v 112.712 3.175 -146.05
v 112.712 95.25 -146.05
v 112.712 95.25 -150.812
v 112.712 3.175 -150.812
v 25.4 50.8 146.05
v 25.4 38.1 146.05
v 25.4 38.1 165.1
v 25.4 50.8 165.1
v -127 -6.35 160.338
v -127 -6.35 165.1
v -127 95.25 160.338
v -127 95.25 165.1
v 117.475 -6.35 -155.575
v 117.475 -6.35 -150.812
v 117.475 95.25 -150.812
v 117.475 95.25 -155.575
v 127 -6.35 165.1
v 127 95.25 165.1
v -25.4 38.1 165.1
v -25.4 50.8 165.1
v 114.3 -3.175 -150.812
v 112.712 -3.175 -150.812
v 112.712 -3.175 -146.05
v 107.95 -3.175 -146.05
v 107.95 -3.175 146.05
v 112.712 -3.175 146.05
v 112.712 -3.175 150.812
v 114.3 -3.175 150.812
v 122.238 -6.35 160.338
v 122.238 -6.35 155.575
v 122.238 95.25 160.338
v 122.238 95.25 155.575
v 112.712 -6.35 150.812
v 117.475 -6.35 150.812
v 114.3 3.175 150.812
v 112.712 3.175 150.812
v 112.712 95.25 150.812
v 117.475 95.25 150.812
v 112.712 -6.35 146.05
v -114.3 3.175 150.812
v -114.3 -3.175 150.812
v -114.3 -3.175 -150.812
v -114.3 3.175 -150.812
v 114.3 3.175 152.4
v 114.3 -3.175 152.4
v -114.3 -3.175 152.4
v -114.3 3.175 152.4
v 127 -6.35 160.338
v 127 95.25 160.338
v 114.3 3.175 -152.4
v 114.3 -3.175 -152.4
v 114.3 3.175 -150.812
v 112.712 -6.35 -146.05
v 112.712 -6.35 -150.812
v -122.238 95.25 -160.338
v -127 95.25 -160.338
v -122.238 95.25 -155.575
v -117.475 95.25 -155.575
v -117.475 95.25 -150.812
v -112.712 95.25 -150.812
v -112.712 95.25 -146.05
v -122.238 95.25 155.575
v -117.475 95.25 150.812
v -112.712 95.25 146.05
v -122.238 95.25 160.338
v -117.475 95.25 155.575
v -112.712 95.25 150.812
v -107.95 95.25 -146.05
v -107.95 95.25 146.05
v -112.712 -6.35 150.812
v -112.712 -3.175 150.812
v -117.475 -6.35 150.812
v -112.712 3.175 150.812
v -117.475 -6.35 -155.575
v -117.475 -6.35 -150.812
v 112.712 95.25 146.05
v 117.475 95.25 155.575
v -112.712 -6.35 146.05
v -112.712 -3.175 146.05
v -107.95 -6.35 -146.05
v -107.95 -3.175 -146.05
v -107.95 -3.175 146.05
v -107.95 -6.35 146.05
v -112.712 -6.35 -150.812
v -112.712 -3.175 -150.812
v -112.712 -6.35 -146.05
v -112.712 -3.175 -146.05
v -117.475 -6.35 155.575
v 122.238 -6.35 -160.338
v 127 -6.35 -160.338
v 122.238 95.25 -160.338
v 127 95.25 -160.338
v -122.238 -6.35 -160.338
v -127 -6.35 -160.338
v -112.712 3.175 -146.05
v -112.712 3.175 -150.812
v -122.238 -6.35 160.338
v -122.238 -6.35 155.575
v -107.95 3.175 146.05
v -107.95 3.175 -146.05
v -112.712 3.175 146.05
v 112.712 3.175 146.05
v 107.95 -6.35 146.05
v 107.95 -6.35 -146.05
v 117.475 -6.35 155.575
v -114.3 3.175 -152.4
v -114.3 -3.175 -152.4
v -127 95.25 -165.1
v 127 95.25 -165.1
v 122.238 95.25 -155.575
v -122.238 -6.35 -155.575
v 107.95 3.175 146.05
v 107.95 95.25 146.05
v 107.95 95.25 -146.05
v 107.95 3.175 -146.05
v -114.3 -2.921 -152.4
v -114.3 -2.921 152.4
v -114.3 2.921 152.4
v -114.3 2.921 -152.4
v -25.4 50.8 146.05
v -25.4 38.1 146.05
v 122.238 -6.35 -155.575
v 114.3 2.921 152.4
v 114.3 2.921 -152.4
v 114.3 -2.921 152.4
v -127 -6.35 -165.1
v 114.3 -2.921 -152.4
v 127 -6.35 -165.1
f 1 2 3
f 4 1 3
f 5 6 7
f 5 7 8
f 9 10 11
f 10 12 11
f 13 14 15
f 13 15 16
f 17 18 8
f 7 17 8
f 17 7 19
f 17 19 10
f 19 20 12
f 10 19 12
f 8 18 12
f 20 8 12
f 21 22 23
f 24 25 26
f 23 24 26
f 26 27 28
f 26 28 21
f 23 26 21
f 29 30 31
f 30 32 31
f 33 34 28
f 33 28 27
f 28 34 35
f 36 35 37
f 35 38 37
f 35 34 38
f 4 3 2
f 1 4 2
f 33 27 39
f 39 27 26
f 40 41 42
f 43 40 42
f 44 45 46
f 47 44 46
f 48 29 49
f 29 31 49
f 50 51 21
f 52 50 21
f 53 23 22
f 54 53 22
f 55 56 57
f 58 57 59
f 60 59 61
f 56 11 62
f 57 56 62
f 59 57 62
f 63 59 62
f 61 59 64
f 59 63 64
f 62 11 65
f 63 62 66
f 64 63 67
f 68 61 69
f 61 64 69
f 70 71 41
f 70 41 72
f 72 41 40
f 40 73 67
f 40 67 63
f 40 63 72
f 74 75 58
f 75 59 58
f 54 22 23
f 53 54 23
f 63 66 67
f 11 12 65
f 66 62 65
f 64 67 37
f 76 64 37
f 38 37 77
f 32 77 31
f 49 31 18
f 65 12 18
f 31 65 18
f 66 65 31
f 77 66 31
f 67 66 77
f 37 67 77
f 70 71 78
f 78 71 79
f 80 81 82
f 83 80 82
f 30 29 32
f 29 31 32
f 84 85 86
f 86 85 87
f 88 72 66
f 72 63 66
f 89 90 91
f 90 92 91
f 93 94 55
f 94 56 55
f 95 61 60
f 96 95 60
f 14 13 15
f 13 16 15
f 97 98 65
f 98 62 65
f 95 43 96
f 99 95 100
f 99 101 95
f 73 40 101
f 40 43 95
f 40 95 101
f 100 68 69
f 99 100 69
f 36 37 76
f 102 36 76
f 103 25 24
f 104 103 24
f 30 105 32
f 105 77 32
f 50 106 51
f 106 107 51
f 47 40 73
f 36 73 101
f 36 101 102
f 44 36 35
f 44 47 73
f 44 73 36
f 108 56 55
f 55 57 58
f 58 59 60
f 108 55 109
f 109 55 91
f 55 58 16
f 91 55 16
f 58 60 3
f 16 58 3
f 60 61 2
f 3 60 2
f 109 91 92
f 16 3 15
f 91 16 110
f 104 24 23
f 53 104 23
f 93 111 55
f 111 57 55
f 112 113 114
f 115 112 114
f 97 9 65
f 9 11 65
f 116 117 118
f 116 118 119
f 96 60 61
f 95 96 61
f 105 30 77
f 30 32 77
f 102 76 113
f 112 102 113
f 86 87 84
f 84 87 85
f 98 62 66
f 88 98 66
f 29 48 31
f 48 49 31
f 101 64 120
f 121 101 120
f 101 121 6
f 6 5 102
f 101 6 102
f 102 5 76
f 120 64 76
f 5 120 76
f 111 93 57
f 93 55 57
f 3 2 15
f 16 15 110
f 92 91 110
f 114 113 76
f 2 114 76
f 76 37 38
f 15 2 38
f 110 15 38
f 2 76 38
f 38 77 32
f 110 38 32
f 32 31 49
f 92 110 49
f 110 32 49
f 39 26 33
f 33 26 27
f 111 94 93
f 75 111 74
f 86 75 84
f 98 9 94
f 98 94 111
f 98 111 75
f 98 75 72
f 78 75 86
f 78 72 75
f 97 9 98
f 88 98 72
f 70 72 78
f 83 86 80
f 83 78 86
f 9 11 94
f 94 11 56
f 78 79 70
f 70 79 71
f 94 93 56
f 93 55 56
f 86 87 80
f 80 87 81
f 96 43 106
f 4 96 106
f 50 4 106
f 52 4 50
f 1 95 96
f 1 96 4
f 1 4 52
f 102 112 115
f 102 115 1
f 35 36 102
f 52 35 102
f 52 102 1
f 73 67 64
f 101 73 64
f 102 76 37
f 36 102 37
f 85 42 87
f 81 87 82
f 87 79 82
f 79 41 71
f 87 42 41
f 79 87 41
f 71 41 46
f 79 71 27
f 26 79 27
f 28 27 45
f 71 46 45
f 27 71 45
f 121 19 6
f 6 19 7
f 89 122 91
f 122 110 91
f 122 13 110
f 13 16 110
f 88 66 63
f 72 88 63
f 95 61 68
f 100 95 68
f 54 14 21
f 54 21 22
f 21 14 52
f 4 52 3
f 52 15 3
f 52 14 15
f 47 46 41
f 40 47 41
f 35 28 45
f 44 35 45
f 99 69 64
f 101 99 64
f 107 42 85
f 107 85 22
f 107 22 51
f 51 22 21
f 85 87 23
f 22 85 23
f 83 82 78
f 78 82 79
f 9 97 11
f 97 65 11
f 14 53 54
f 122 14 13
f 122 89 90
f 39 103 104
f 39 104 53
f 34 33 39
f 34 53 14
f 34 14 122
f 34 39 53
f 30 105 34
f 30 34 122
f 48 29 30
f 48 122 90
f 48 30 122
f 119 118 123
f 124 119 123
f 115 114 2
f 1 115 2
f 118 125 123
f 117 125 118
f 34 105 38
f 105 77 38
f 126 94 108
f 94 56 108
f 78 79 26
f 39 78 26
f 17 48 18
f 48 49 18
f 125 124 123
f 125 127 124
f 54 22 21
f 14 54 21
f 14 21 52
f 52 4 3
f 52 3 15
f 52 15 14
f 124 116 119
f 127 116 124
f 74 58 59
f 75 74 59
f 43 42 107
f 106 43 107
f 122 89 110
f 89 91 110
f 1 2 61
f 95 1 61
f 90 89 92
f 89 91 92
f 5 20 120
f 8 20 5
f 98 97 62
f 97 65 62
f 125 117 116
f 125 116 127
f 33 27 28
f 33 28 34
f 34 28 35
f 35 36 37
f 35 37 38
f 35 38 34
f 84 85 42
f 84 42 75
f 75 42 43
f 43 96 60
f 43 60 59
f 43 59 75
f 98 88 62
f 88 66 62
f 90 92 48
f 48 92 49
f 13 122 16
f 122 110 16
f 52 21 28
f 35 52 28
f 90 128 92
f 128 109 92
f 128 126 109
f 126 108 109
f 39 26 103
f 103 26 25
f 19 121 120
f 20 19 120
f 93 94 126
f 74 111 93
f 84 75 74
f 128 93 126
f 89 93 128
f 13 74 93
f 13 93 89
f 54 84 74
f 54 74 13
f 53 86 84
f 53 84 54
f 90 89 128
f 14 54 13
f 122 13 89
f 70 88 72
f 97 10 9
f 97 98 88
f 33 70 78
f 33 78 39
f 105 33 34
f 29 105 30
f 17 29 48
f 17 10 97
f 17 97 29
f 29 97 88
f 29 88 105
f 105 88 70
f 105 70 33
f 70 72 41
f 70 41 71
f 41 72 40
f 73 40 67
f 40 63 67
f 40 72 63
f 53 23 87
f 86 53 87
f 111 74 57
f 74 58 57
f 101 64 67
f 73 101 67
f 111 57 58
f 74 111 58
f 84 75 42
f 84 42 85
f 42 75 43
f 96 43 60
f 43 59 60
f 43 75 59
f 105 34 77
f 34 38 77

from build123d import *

# Parameters (mm, degrees)
F1_DEPTH      = 95.25
F1_DEPTH_BACK = 6.35
F2_DEPTH      = 95.25
F2_DEPTH_BACK = 6.35
F3_DEPTH      = 3.175
F4_DEPTH      = 2.921
F5_W          = 50.8
F5_H          = 12.7
F6_DEPTH      = 25.4


with BuildPart() as f1:
    # F0 (on Front) → F1 (new body, two sides)
    with BuildSketch(Plane.XZ) as f1_sk:
        Polygon((-117.475, -150.8125), (-114.3, -150.8125), (-114.3, 150.8125), (-117.475, 150.8125), (-117.475, 155.575), (-122.2375, 155.575), (-122.2375, 160.3375), (-127, 160.3375), (-127, 0), (-127, -160.3375), (-122.2375, -160.3375), (-122.2375, -155.575), (-117.475, -155.575), align=None)
        Polygon((-107.95, -146.05), (-107.95, 0), (-107.95, 146.05), (-112.7125, 146.05), (-112.7125, 150.8125), (-114.3, 150.8125), (-114.3, -150.8125), (-112.7125, -150.8125), (-112.7125, -146.05), align=None)
    extrude(amount=-F1_DEPTH)
    extrude(f1_sk.sketch, amount=F1_DEPTH_BACK)


with BuildPart() as f1b:
    # F0 (on Front) → F1, piece 2 (new body, two sides)
    with BuildSketch(Plane.XZ) as f1_2_sk:
        Polygon((114.3, 150.8125), (114.3, -150.8125), (117.475, -150.8125), (117.475, -155.575), (122.2375, -155.575), (122.2375, -160.3375), (127, -160.3375), (127, 0), (127, 160.3375), (122.2375, 160.3375), (122.2375, 155.575), (117.475, 155.575), (117.475, 150.8125), align=None)
        Polygon((107.95, 0), (107.95, -146.05), (112.7125, -146.05), (112.7125, -150.8125), (114.3, -150.8125), (114.3, 150.8125), (112.7125, 150.8125), (112.7125, 146.05), (107.95, 146.05), align=None)
    extrude(amount=-F1_DEPTH)
    extrude(f1_2_sk.sketch, amount=F1_DEPTH_BACK)


with BuildPart() as f2:
    # F0 (on Front) → F2 (new body, two sides)
    with BuildSketch(Plane.XZ) as f2_sk:
        Polygon((-117.475, 150.8125), (-114.3, 150.8125), (-114.3, 152.4), (114.3, 152.4), (114.3, 150.8125), (117.475, 150.8125), (117.475, 155.575), (122.2375, 155.575), (122.2375, 160.3375), (127, 160.3375), (127, 165.1), (0, 165.1), (-127, 165.1), (-127, 160.3375), (-122.2375, 160.3375), (-122.2375, 155.575), (-117.475, 155.575), align=None)
        Polygon((-112.7125, 146.05), (-107.95, 146.05), (0, 146.05), (107.95, 146.05), (112.7125, 146.05), (112.7125, 150.8125), (114.3, 150.8125), (114.3, 152.4), (-114.3, 152.4), (-114.3, 150.8125), (-112.7125, 150.8125), align=None)
    extrude(amount=-F2_DEPTH)
    extrude(f2_sk.sketch, amount=F2_DEPTH_BACK)


with BuildPart() as f2b:
    # F0 (on Front) → F2, piece 2 (new body, two sides)
    with BuildSketch(Plane.XZ) as f2_2_sk:
        Polygon((0, -146.05), (-107.95, -146.05), (-112.7125, -146.05), (-112.7125, -150.8125), (-114.3, -150.8125), (-114.3, -152.4), (114.3, -152.4), (114.3, -150.8125), (112.7125, -150.8125), (112.7125, -146.05), (107.95, -146.05), align=None)
        Polygon((-114.3, -152.4), (-114.3, -150.8125), (-117.475, -150.8125), (-117.475, -155.575), (-122.2375, -155.575), (-122.2375, -160.3375), (-127, -160.3375), (-127, -165.1), (0, -165.1), (127, -165.1), (127, -160.3375), (122.2375, -160.3375), (122.2375, -155.575), (117.475, -155.575), (117.475, -150.8125), (114.3, -150.8125), (114.3, -152.4), align=None)
    extrude(amount=-F2_DEPTH)
    extrude(f2_2_sk.sketch, amount=F2_DEPTH_BACK)


with BuildPart() as f3_tool:
    # F0 (on Front) → F3 (new body, symmetric)
    with BuildSketch(Plane.XZ):
        Polygon((0, -146.05), (-107.95, -146.05), (-112.7125, -146.05), (-112.7125, -150.8125), (-114.3, -150.8125), (-114.3, -152.4), (114.3, -152.4), (114.3, -150.8125), (112.7125, -150.8125), (112.7125, -146.05), (107.95, -146.05), align=None)
        Polygon((-107.95, -146.05), (-107.95, 0), (-107.95, 146.05), (-112.7125, 146.05), (-112.7125, 150.8125), (-114.3, 150.8125), (-114.3, -150.8125), (-112.7125, -150.8125), (-112.7125, -146.05), align=None)
        Polygon((107.95, 0), (107.95, -146.05), (112.7125, -146.05), (112.7125, -150.8125), (114.3, -150.8125), (114.3, 150.8125), (112.7125, 150.8125), (112.7125, 146.05), (107.95, 146.05), align=None)
        Polygon((-112.7125, 146.05), (-107.95, 146.05), (0, 146.05), (107.95, 146.05), (112.7125, 146.05), (112.7125, 150.8125), (114.3, 150.8125), (114.3, 152.4), (-114.3, 152.4), (-114.3, 150.8125), (-112.7125, 150.8125), align=None)
    extrude(amount=F3_DEPTH, both=True)


with BuildPart() as f1_1:
    add(f1.part)

    # F3: cut by f3_tool
    add(f3_tool.part, mode=Mode.SUBTRACT)


with BuildPart() as f1b_1:
    add(f1b.part)

    # F3: cut by f3_tool
    add(f3_tool.part, mode=Mode.SUBTRACT)


with BuildPart() as f2_1:
    add(f2.part)

    # F3: cut by f3_tool
    add(f3_tool.part, mode=Mode.SUBTRACT)

    # F5 (on face) → F6 (cut)
    with BuildSketch(Plane.XY.offset(165.1)):
        with Locations((0, 44.45)):
            Rectangle(F5_W, F5_H)
    extrude(amount=-F6_DEPTH, mode=Mode.SUBTRACT)


with BuildPart() as f2b_1:
    add(f2b.part)

    # F3: cut by f3_tool
    add(f3_tool.part, mode=Mode.SUBTRACT)


with BuildPart() as f4:
    # F0 (on Front) → F4 (new body, symmetric)
    with BuildSketch(Plane.XZ):
        Polygon((-107.95, -146.05), (-107.95, 0), (-107.95, 146.05), (-112.7125, 146.05), (-112.7125, 150.8125), (-114.3, 150.8125), (-114.3, -150.8125), (-112.7125, -150.8125), (-112.7125, -146.05), align=None)
        Polygon((-107.95, 146.05), (-107.95, 0), (-107.95, -146.05), (0, -146.05), (107.95, -146.05), (107.95, 0), (107.95, 146.05), (0, 146.05), align=None)
        Polygon((-112.7125, 146.05), (-107.95, 146.05), (0, 146.05), (107.95, 146.05), (112.7125, 146.05), (112.7125, 150.8125), (114.3, 150.8125), (114.3, 152.4), (-114.3, 152.4), (-114.3, 150.8125), (-112.7125, 150.8125), align=None)
        Polygon((107.95, 0), (107.95, -146.05), (112.7125, -146.05), (112.7125, -150.8125), (114.3, -150.8125), (114.3, 150.8125), (112.7125, 150.8125), (112.7125, 146.05), (107.95, 146.05), align=None)
        Polygon((0, -146.05), (-107.95, -146.05), (-112.7125, -146.05), (-112.7125, -150.8125), (-114.3, -150.8125), (-114.3, -152.4), (114.3, -152.4), (114.3, -150.8125), (112.7125, -150.8125), (112.7125, -146.05), (107.95, -146.05), align=None)
    extrude(amount=F4_DEPTH, both=True)


solid = Compound([f1_1.part, f1b_1.part, f2_1.part, f2b_1.part, f4.part])
